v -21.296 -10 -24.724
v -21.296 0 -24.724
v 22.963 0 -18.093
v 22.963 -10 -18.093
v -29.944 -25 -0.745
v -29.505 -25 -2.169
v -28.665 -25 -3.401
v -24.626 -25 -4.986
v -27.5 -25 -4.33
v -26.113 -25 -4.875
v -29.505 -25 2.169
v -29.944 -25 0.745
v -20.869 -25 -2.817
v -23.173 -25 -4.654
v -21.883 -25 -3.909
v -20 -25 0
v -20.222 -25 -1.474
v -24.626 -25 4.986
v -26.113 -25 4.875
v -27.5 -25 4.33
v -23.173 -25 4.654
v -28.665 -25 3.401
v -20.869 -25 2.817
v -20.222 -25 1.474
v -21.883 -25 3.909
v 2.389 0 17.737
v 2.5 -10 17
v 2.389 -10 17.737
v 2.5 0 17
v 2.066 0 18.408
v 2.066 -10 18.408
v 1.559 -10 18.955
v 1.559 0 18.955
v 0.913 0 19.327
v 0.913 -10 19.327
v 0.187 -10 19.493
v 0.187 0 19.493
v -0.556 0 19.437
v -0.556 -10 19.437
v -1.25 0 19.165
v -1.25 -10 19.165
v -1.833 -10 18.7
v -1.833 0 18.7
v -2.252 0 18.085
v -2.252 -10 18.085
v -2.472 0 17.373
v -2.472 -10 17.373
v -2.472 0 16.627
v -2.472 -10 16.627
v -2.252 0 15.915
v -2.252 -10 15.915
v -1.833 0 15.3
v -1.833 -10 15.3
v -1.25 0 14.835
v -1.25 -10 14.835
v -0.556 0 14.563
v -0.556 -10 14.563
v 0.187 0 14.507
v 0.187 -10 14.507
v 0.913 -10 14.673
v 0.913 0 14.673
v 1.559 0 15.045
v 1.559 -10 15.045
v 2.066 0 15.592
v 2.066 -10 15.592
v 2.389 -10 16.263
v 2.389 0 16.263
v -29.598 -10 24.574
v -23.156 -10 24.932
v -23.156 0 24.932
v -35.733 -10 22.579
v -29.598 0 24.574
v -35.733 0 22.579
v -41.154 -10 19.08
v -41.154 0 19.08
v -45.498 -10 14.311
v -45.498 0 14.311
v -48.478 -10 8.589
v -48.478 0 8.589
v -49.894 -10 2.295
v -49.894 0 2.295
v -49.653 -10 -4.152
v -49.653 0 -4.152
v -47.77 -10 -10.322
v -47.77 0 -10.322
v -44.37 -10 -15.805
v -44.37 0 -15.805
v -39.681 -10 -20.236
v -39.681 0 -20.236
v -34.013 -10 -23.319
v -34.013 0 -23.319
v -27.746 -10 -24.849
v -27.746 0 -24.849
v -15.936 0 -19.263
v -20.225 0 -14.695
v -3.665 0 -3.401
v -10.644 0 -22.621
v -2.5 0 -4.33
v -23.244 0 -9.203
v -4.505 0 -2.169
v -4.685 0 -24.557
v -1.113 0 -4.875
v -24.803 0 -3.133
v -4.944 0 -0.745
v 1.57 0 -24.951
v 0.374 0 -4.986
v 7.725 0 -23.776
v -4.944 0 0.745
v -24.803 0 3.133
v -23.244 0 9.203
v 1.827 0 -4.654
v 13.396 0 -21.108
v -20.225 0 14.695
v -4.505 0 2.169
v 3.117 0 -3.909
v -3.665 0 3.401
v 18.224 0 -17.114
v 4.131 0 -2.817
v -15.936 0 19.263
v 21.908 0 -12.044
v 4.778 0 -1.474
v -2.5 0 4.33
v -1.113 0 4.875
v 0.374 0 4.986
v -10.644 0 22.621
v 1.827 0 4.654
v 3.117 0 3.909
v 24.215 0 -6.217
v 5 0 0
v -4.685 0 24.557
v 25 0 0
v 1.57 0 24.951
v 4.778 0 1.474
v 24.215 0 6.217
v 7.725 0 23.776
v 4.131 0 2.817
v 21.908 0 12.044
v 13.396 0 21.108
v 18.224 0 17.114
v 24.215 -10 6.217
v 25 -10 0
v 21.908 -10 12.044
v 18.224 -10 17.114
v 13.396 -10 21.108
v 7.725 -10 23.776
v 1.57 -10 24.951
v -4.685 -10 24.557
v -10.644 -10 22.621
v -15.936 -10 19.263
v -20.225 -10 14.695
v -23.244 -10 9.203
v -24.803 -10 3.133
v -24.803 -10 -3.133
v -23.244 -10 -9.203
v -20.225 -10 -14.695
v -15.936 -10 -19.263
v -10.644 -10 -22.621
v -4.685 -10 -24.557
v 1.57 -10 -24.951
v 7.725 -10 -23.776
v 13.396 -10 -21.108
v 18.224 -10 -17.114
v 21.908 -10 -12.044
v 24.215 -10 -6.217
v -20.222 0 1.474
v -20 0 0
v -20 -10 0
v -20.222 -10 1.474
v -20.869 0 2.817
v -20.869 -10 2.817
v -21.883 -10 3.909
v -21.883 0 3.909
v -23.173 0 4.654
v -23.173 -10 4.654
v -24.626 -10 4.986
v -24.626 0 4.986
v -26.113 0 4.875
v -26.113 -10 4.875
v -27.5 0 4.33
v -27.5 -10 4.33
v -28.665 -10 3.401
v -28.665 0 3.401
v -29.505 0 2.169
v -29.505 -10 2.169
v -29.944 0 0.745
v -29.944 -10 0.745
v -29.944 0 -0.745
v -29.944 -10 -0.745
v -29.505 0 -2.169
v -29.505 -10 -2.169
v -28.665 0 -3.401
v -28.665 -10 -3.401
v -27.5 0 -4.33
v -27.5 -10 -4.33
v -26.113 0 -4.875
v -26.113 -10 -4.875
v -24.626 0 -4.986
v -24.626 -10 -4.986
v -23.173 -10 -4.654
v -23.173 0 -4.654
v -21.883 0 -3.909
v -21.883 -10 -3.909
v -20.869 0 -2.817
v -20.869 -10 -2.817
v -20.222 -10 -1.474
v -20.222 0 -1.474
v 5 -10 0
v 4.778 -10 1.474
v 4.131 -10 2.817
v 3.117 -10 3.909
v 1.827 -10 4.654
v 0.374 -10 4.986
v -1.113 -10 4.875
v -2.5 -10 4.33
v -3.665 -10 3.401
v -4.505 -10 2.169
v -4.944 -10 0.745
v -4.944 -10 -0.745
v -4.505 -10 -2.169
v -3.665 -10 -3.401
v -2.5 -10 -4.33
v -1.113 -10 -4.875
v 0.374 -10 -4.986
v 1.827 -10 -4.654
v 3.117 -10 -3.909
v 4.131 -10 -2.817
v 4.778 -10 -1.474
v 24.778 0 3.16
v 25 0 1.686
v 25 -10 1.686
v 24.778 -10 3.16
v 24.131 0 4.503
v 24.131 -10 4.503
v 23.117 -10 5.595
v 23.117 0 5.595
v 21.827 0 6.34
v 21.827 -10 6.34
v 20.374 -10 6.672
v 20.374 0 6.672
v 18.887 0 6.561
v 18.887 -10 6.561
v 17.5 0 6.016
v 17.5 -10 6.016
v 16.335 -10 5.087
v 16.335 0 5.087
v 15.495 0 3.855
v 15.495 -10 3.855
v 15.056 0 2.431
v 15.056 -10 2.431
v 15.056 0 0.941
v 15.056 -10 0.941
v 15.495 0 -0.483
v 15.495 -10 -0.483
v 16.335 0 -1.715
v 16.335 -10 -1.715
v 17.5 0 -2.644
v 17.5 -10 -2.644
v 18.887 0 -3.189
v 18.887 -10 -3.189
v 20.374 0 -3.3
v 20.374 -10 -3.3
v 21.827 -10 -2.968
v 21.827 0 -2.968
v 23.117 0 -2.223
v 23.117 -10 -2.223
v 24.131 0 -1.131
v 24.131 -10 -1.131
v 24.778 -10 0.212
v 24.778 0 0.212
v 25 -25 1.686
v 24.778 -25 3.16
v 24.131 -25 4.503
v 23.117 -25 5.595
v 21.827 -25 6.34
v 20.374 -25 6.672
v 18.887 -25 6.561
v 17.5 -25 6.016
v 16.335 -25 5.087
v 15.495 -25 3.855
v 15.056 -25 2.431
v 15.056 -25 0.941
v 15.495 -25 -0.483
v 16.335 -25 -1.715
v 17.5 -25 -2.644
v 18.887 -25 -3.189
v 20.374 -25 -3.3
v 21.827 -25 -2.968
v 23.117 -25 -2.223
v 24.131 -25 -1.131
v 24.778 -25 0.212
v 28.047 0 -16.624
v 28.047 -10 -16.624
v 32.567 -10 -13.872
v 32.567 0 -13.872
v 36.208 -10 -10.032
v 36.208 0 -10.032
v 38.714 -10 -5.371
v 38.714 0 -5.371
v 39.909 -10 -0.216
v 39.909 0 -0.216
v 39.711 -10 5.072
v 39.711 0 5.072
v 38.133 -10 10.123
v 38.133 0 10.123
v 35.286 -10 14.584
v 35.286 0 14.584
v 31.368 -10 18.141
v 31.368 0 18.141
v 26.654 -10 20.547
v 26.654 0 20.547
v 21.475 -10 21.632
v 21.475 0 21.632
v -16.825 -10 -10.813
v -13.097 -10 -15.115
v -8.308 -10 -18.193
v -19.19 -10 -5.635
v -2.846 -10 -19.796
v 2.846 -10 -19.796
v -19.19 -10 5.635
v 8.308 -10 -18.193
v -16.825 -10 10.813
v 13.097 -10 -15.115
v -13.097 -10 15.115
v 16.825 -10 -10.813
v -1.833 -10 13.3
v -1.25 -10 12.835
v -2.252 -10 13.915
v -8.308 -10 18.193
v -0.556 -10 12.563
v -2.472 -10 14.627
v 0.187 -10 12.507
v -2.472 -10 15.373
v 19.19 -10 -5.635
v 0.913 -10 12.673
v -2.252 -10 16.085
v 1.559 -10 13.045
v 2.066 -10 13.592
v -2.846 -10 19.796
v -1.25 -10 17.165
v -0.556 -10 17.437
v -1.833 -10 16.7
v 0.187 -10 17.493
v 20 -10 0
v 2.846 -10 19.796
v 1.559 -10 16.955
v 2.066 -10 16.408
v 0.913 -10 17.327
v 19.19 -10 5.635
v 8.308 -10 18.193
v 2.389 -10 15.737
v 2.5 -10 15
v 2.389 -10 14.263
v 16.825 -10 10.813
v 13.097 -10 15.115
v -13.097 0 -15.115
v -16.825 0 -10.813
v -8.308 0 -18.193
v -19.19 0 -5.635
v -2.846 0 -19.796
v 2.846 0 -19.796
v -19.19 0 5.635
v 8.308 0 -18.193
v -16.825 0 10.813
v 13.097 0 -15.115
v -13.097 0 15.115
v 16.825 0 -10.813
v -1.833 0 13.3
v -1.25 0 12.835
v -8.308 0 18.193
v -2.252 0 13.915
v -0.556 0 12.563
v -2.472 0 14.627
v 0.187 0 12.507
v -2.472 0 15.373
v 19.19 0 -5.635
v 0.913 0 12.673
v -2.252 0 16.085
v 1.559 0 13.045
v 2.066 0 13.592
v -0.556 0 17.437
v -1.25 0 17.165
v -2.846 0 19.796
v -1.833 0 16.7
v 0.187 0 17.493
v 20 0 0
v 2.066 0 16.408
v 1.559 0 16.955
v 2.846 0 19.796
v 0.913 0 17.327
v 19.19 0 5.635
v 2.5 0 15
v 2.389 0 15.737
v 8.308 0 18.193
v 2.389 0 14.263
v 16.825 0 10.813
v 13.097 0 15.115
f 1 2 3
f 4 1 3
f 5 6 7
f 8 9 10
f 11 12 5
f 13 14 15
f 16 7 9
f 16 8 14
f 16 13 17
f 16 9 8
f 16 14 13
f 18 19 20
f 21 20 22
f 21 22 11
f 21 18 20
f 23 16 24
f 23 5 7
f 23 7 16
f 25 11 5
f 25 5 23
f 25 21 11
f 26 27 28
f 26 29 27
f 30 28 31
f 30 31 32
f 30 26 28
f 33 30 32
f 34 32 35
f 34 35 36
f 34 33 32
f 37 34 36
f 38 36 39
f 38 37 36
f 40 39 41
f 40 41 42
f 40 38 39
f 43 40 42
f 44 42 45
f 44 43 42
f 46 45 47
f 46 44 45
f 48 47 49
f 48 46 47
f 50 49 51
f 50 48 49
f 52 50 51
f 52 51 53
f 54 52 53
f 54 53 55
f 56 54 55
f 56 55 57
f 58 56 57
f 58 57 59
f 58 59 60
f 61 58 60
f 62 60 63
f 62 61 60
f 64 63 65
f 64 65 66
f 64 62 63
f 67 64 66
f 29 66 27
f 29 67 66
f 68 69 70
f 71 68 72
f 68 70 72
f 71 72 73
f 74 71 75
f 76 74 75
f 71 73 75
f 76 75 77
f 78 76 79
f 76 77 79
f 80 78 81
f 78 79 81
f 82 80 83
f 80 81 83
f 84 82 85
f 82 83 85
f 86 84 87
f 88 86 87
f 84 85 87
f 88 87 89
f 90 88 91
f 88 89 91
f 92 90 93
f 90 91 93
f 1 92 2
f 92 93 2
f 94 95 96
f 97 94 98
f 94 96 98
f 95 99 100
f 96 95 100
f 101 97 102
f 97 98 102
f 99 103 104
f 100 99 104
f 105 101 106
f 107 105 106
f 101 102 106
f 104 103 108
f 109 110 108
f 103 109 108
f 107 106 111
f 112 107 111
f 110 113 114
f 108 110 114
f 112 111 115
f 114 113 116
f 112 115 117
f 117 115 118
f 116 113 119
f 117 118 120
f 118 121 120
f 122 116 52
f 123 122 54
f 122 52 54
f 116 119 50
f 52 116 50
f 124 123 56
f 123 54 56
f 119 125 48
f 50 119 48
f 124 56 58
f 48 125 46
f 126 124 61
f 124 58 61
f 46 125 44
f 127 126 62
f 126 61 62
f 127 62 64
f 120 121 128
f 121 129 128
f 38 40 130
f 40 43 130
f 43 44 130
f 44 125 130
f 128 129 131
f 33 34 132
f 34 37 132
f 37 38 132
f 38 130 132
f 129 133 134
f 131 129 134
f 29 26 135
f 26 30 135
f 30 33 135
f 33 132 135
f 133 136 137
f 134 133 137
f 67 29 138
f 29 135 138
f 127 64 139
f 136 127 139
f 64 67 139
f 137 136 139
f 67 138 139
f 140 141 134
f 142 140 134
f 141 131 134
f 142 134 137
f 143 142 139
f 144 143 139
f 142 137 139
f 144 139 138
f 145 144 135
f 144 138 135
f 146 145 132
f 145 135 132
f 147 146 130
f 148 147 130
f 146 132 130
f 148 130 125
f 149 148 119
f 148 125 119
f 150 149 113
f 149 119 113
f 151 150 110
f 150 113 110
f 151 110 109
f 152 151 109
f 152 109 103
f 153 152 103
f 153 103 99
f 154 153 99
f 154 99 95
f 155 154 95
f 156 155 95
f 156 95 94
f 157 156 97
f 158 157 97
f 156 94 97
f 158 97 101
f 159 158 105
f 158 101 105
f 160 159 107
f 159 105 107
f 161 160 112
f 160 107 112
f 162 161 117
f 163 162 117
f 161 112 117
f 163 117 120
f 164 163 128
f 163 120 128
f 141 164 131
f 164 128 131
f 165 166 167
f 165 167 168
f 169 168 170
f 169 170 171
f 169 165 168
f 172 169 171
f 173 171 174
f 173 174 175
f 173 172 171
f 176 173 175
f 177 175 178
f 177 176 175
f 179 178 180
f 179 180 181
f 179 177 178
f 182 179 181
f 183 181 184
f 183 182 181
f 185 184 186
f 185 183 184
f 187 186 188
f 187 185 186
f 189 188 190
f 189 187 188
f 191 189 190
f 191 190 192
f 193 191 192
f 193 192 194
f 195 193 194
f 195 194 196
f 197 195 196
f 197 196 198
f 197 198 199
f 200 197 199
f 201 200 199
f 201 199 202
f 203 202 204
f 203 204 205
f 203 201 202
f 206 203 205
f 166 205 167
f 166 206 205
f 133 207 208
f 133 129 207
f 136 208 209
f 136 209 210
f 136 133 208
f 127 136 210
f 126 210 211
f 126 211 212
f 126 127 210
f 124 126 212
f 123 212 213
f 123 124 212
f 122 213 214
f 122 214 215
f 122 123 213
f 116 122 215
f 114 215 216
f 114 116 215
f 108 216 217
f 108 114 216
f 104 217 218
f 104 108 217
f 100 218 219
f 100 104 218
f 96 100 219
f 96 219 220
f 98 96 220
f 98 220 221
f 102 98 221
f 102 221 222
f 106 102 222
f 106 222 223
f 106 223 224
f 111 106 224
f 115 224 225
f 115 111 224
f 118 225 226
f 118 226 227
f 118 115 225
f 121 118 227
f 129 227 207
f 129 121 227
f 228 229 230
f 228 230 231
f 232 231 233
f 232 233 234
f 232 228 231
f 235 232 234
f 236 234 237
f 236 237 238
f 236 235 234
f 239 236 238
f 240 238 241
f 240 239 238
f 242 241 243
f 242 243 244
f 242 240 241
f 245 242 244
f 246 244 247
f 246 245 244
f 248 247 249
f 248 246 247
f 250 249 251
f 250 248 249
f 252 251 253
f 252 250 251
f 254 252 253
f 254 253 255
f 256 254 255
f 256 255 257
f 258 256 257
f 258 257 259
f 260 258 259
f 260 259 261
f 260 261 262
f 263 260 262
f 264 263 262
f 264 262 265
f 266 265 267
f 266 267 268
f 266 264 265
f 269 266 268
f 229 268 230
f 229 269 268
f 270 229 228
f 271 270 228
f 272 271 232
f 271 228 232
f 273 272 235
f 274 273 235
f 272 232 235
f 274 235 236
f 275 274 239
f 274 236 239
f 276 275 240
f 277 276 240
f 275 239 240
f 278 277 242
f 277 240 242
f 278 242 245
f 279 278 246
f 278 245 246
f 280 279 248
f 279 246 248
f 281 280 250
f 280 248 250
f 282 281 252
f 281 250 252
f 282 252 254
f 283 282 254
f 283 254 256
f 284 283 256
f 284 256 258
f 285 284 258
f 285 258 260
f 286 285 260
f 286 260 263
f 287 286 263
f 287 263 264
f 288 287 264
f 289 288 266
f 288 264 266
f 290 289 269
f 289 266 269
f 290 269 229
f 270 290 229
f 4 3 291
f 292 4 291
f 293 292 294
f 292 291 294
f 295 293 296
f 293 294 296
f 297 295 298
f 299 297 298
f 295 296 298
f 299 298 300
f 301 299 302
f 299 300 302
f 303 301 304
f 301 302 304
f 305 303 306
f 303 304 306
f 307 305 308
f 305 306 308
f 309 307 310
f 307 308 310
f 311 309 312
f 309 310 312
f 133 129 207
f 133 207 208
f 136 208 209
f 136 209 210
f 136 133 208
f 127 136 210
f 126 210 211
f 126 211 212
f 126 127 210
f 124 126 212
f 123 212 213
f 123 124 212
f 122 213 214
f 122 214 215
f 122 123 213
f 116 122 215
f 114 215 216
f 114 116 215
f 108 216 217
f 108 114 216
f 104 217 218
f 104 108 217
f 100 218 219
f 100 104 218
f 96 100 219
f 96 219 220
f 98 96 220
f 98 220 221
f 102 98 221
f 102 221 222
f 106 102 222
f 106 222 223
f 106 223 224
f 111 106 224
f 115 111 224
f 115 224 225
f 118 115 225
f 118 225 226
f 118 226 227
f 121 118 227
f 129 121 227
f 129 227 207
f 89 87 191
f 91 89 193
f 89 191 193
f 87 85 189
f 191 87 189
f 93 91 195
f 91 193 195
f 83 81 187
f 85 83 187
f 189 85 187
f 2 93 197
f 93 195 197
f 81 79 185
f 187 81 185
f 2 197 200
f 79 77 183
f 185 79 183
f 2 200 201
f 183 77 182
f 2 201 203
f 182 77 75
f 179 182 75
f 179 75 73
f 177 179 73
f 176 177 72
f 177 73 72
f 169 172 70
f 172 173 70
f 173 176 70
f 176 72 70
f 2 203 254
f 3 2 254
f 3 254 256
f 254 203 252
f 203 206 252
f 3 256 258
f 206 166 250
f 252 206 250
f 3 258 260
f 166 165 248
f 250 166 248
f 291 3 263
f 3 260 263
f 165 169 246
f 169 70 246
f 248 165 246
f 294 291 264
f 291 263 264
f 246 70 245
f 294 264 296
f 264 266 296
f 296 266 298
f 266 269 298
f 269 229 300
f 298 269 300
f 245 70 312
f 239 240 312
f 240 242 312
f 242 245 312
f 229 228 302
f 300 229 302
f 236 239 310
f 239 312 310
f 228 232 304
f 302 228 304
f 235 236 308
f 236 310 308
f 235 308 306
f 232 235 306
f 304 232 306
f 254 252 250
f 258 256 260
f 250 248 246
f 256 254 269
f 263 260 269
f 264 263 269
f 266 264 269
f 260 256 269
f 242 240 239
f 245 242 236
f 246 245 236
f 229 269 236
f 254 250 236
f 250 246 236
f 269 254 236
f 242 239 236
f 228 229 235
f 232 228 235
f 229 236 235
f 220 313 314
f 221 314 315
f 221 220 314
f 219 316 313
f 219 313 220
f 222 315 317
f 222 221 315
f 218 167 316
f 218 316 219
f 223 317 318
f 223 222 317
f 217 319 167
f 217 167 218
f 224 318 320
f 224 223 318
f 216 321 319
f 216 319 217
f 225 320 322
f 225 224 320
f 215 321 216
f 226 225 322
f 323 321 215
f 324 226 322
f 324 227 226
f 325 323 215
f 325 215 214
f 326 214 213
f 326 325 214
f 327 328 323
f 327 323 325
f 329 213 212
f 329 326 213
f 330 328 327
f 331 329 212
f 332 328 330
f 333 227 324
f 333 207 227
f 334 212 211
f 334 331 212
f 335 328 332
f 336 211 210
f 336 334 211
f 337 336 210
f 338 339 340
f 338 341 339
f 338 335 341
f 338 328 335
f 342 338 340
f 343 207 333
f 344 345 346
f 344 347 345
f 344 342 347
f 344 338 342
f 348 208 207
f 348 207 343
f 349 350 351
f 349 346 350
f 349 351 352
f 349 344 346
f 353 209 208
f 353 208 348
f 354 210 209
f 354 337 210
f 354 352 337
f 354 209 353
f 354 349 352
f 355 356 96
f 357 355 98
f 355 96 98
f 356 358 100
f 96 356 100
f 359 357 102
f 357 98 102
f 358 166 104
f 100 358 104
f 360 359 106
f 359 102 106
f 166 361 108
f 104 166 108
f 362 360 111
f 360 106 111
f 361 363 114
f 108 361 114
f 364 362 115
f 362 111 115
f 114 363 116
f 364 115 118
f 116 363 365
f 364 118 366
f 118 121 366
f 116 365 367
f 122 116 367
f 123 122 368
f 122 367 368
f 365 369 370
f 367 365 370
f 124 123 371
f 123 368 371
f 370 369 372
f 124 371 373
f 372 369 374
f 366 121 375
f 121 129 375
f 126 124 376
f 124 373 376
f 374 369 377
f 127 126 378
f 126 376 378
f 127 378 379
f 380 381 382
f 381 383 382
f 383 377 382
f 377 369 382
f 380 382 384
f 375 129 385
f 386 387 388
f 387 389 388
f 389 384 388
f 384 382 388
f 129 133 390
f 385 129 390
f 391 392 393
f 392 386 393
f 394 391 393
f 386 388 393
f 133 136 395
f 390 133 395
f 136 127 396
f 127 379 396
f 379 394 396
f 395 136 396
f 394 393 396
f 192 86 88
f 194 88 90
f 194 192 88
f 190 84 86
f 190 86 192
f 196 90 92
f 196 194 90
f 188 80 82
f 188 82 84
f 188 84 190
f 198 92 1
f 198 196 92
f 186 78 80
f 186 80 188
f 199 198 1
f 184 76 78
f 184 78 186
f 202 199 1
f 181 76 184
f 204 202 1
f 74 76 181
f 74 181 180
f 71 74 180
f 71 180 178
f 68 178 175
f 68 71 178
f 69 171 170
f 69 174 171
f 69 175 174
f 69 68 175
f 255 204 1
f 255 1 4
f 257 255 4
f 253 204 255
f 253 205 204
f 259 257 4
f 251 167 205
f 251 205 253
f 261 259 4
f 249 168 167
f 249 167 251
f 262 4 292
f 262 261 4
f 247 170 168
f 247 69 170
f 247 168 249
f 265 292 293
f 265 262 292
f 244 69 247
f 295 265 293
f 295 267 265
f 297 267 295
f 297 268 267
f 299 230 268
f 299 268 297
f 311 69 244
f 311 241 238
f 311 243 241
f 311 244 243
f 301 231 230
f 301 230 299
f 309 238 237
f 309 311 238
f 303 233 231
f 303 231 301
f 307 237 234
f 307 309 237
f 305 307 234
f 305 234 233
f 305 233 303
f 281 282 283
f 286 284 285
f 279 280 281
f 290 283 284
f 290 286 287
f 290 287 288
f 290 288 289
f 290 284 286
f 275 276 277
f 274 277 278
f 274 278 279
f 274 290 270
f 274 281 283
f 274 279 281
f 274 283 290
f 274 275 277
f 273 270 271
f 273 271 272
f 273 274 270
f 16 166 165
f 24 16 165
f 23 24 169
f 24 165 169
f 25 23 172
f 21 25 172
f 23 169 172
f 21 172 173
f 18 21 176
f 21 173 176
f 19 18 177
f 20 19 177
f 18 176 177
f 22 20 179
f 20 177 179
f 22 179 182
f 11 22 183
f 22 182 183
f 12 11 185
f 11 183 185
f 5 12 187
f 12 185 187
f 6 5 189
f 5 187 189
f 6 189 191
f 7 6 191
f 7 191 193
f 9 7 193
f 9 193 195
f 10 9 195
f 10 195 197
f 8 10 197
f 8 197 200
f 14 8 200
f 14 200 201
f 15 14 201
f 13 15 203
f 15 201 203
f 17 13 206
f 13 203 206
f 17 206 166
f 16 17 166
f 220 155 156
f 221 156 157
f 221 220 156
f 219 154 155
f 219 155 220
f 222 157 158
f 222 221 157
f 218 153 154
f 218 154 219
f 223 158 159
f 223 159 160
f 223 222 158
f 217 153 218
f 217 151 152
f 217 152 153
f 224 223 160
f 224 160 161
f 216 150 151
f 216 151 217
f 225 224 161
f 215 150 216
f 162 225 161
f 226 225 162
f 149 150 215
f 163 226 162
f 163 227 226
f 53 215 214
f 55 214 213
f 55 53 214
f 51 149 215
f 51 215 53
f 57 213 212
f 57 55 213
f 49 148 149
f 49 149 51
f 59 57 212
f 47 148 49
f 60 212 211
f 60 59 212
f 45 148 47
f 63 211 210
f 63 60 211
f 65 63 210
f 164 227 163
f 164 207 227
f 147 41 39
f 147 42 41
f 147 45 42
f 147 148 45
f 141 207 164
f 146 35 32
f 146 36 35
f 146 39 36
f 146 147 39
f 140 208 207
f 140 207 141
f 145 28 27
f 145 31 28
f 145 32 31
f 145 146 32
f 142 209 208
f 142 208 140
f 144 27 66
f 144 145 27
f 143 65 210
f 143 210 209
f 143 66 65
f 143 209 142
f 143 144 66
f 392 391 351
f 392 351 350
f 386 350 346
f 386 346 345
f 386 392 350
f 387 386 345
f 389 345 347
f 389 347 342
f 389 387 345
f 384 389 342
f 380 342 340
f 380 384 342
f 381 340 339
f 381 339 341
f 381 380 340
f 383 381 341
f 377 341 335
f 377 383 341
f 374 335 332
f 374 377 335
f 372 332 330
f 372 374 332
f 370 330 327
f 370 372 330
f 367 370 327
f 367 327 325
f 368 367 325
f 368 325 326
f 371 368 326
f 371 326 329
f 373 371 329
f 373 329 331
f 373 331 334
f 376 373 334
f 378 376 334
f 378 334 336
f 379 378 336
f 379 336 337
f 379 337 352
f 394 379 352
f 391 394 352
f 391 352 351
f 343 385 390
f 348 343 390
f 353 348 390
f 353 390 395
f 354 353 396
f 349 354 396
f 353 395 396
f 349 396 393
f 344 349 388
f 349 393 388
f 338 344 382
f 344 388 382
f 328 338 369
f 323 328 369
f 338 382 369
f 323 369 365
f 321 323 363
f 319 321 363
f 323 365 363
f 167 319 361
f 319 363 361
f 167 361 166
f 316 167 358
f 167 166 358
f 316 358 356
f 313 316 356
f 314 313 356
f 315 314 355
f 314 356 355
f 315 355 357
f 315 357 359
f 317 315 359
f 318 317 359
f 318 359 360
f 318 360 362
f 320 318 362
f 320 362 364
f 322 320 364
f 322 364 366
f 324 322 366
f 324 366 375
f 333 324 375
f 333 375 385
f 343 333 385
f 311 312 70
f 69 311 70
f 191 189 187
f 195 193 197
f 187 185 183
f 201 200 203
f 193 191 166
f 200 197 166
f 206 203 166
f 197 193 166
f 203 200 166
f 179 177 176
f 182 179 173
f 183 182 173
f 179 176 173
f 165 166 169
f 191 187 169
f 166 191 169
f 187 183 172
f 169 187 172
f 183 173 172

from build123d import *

# Parameters (mm, degrees)
F0_R        = 25
F0_R_2      = 5
F0_R_3      = 2.5
F1_DEPTH    = 25
F1_FACE_R   = 25
F1_FACE_R_2 = 5
F1_FACE_R_3 = 2.5
F2_DEPTH    = 12.9
F3_DEPTH    = 15
F4_R        = 20
F4_R_2      = 5
F4_R_3      = 2.5
F5_DEPTH    = 25
F5_FACE_R   = 20
F5_FACE_R_2 = 5
F5_FACE_R_3 = 2.5
F6_DEPTH    = 15
F7_R        = 5
F8_DEPTH    = 25
F9_DEPTH    = 10


with BuildPart() as f1:
    # F0 (on Front) → F1 (new body)
    with BuildSketch(Plane.XZ):
        Circle(F0_R)
        Circle(F0_R_2, mode=Mode.SUBTRACT)
        with Locations((0, 17)):
            Circle(F0_R_3, mode=Mode.SUBTRACT)
    extrude(amount=F1_DEPTH)

    # F1_face (on face) → F2 (join)
    with BuildSketch(Plane(origin=(0, -25, -0.178947), x_dir=(1, 0, 0), z_dir=(0, -1, 0))):
        with Locations((0, 0.178947)):
            Circle(F1_FACE_R)
        with Locations((0, 0.178947)):
            Circle(F1_FACE_R_2, mode=Mode.SUBTRACT)
        with Locations((0, 17.178947)):
            Circle(F1_FACE_R_3, mode=Mode.SUBTRACT)
    extrude(amount=-F2_DEPTH)

    # F1_face (on face) → F3 (cut)
    with BuildSketch(Plane(origin=(0, -25, -0.178947), x_dir=(1, 0, 0), z_dir=(0, -1, 0))):
        with Locations((0, 0.178947)):
            Circle(F1_FACE_R)
        with Locations((0, 0.178947)):
            Circle(F1_FACE_R_2, mode=Mode.SUBTRACT)
        with Locations((0, 17.178947)):
            Circle(F1_FACE_R_3, mode=Mode.SUBTRACT)
    extrude(amount=-F3_DEPTH, mode=Mode.SUBTRACT)


with BuildPart() as f5:
    # F4 (on Front) → F5 (new body)
    with BuildSketch(Plane.XZ):
        Circle(F4_R)
        Circle(F4_R_2, mode=Mode.SUBTRACT)
        with Locations((0, 15)):
            Circle(F4_R_3, mode=Mode.SUBTRACT)
    extrude(amount=F5_DEPTH)

    # F5_face (on face) → F6 (cut)
    with BuildSketch(Plane(origin=(0, -25, -0.254237), x_dir=(1, 0, 0), z_dir=(0, -1, 0))):
        with Locations((0, 0.254237)):
            Circle(F5_FACE_R)
        with Locations((0, 0.254237)):
            Circle(F5_FACE_R_2, mode=Mode.SUBTRACT)
        with Locations((0, 15.254237)):
            Circle(F5_FACE_R_3, mode=Mode.SUBTRACT)
    extrude(amount=-F6_DEPTH, mode=Mode.SUBTRACT)


with BuildPart() as f8:
    # F7 (on Front) → F8 (new body)
    with BuildSketch(Plane.XZ):
        with Locations((20, 1.686059)):
            Circle(F7_R)
        with Locations((-25, 0)):
            Circle(F7_R)
    extrude(amount=F8_DEPTH)


with BuildPart() as f9:
    # F7 (on Front) → F9 (new body)
    with BuildSketch(Plane.XZ):
        with BuildLine():
            Line((21.474903, 21.631601), (-23.156371, 24.931928))
            ThreePointArc((-23.156371, 24.931928), (-49.98247, -0.936043), (-21.295862, -24.724064))
            Line((-21.295862, -24.724064), (22.963311, -18.093193))
            ThreePointArc((22.963311, -18.093193), (39.985976, 2.434893), (21.474903, 21.631601))
        make_face()
        with Locations((-25, 0)):
            Circle(F7_R, mode=Mode.SUBTRACT)
        with Locations((20, 1.686059)):
            Circle(F7_R, mode=Mode.SUBTRACT)
    extrude(amount=F9_DEPTH)


solid = Compound([f1.part, f5.part, f8.part, f9.part])
